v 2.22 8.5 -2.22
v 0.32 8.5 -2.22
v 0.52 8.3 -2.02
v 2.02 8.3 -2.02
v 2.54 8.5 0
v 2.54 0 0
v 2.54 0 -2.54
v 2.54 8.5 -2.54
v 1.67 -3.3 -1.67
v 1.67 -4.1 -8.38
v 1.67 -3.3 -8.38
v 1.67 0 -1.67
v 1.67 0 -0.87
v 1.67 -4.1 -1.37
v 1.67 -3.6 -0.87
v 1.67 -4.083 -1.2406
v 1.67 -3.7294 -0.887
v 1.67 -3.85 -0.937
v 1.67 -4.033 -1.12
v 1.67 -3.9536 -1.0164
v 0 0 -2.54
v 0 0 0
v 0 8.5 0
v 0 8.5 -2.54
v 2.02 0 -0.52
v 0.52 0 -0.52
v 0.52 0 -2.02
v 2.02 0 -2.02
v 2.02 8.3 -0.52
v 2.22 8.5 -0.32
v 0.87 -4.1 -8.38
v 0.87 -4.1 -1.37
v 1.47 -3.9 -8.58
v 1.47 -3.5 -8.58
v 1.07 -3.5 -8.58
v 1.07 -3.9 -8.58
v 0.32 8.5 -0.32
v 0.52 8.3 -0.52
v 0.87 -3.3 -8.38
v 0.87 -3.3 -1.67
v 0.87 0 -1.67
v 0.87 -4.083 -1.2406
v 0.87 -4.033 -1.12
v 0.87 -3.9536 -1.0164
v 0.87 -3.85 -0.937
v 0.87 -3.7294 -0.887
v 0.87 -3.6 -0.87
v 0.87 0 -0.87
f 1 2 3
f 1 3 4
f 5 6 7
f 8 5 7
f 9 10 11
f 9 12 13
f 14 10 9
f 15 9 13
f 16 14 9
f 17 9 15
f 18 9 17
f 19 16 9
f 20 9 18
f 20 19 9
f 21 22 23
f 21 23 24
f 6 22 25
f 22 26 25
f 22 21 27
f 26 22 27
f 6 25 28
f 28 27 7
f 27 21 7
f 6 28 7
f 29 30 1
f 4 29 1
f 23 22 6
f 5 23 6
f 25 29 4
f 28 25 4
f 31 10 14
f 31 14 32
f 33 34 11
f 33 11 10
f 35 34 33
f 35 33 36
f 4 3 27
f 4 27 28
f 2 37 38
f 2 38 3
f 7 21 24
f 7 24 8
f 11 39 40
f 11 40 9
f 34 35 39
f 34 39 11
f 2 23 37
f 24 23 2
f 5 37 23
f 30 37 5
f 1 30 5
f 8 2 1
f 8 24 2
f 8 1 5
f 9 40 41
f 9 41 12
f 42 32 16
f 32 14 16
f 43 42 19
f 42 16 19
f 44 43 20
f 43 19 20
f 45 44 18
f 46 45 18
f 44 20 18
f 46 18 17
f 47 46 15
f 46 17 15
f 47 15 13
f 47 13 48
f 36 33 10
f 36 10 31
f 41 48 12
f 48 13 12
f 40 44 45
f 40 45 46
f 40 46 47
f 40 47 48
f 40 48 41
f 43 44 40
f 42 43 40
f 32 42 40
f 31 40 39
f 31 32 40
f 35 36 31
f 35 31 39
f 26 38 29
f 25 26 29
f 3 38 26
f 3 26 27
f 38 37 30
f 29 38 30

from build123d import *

# Parameters (mm, degrees)
SKETCH_1_W      = 2.54
SKETCH_1_H      = 2.54
SKETCH_1_W_2    = 1.5
SKETCH_1_H_2    = 1.5
EXTRUDE_1_DEPTH = 8.5
SKETCH_2_2_W    = 0.8
SKETCH_2_2_H    = 0.8
CHAMFER_1_SIZE  = 0.2
CHAMFER_3_SIZE  = 0.2
FILLET_2_R      = 0.5


with BuildPart() as part:
    # Эскиз1 → Бобышка-Вытянуть1 (new body)
    with BuildSketch(Plane(origin=(0, 0, 0), x_dir=(1, 0, 0), z_dir=(0, 1, 0))):
        with Locations((1.27, 1.27)):
            Rectangle(SKETCH_1_W, SKETCH_1_H)
        with Locations((1.27, 1.27)):
            Rectangle(SKETCH_1_W_2, SKETCH_1_H_2, mode=Mode.SUBTRACT)
    extrude(amount=EXTRUDE_1_DEPTH)

    # Фаска1
    chamfer_1_edges = [part.edges().sort_by_distance(p)[0] for p in [
        (2.02, 8.5, -1.27),
        (1.27, 8.5, -2.02),
        (0.52, 8.5, -1.27),
        (1.27, 8.5, -0.52),
    ]]
    chamfer(chamfer_1_edges, length=CHAMFER_1_SIZE)


with BuildPart() as body_2:
    # По траектории2: sweep along a path in Эскиз4
    with BuildLine(Plane(origin=(1.27, 0, 0), x_dir=(0, 0, -1), z_dir=(1, 0, 0))) as sweep_2_path:
        Line((1.27, 0), (1.27, -3.7))
        Line((1.27, -3.7), (8.58, -3.7))
    # Эскиз2<2> → По траектории2 (sweep)
    with BuildSketch(Plane.XZ):
        with Locations((1.27, -1.27)):
            Rectangle(SKETCH_2_2_W, SKETCH_2_2_H)
    sweep(path=sweep_2_path.line, transition=Transition.RIGHT)

    # Фаска3
    chamfer_3_edges = [body_2.edges().sort_by_distance(p)[0] for p in [
        (0.87, -3.7, -8.58),
        (1.27, -4.1, -8.58),
        (1.67, -3.7, -8.58),
        (1.27, -3.3, -8.58),
    ]]
    chamfer(chamfer_3_edges, length=CHAMFER_3_SIZE)

    # Скругление2
    fillet_2_edges = [body_2.edges().sort_by_distance(p)[0] for p in [
        (1.27, -4.1, -0.87),
    ]]
    fillet(fillet_2_edges, radius=FILLET_2_R)


solid = Compound([part.part, body_2.part])
